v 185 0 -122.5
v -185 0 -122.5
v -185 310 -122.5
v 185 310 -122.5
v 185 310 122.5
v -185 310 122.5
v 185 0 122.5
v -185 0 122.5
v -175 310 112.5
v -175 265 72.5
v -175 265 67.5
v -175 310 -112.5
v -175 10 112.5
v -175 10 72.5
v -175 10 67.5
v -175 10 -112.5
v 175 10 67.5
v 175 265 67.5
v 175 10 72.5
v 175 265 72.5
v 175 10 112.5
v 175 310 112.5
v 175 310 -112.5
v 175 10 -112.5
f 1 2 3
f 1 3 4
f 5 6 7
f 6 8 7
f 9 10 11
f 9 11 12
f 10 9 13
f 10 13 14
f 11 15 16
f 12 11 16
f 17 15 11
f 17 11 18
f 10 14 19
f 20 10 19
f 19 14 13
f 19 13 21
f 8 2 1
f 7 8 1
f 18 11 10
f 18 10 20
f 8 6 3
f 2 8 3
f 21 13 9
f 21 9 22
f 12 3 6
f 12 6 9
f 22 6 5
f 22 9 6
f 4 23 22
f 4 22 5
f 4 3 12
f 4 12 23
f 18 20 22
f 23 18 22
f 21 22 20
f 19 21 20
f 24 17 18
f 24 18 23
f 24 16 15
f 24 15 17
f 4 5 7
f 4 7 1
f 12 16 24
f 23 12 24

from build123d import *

# Parameters (mm, degrees)
SKETCH1_W           = 370
SKETCH1_H           = 245
BOSS_EXTRUDE1_DEPTH = 10
SKETCH2_W           = 370
SKETCH2_H           = 245
SKETCH2_W_2         = 350
SKETCH2_H_2         = 225
SKETCH2_H_3         = 5
BOSS_EXTRUDE3_DEPTH = 300
SKETCH3_W           = 350
SKETCH3_H           = 5
CUT_EXTRUDE1_DEPTH  = 45


with BuildPart() as part:
    # Sketch1 → Boss-Extrude1 (new body)
    with BuildSketch(Plane(origin=(0, 0, 0), x_dir=(1, 0, 0), z_dir=(0, 1, 0))):
        Rectangle(SKETCH1_W, SKETCH1_H)
    extrude(amount=BOSS_EXTRUDE1_DEPTH)

    # Sketch2 → Boss-Extrude3 (add)
    # profile 1 of 2: a face of its own
    with BuildSketch(Plane(origin=(0, 10, 0), x_dir=(1, 0, 0), z_dir=(0, 1, 0))):
        Rectangle(SKETCH2_W, SKETCH2_H)
        Rectangle(SKETCH2_W_2, SKETCH2_H_2, mode=Mode.SUBTRACT)
    # profile 2 of 2: a face of its own
    with BuildSketch(Plane(origin=(0, 10, 0), x_dir=(1, 0, 0), z_dir=(0, 1, 0))):
        with Locations((0, -70)):
            Rectangle(SKETCH2_W_2, SKETCH2_H_3)
    extrude(amount=BOSS_EXTRUDE3_DEPTH)

    # Sketch3 → Cut-Extrude1 (cut)
    with BuildSketch(Plane(origin=(0, 310, 0), x_dir=(1, 0, 0), z_dir=(0, 1, 0))):
        with Locations((0, -70)):
            Rectangle(SKETCH3_W, SKETCH3_H)
    extrude(amount=-CUT_EXTRUDE1_DEPTH, mode=Mode.SUBTRACT)


solid = part.part
